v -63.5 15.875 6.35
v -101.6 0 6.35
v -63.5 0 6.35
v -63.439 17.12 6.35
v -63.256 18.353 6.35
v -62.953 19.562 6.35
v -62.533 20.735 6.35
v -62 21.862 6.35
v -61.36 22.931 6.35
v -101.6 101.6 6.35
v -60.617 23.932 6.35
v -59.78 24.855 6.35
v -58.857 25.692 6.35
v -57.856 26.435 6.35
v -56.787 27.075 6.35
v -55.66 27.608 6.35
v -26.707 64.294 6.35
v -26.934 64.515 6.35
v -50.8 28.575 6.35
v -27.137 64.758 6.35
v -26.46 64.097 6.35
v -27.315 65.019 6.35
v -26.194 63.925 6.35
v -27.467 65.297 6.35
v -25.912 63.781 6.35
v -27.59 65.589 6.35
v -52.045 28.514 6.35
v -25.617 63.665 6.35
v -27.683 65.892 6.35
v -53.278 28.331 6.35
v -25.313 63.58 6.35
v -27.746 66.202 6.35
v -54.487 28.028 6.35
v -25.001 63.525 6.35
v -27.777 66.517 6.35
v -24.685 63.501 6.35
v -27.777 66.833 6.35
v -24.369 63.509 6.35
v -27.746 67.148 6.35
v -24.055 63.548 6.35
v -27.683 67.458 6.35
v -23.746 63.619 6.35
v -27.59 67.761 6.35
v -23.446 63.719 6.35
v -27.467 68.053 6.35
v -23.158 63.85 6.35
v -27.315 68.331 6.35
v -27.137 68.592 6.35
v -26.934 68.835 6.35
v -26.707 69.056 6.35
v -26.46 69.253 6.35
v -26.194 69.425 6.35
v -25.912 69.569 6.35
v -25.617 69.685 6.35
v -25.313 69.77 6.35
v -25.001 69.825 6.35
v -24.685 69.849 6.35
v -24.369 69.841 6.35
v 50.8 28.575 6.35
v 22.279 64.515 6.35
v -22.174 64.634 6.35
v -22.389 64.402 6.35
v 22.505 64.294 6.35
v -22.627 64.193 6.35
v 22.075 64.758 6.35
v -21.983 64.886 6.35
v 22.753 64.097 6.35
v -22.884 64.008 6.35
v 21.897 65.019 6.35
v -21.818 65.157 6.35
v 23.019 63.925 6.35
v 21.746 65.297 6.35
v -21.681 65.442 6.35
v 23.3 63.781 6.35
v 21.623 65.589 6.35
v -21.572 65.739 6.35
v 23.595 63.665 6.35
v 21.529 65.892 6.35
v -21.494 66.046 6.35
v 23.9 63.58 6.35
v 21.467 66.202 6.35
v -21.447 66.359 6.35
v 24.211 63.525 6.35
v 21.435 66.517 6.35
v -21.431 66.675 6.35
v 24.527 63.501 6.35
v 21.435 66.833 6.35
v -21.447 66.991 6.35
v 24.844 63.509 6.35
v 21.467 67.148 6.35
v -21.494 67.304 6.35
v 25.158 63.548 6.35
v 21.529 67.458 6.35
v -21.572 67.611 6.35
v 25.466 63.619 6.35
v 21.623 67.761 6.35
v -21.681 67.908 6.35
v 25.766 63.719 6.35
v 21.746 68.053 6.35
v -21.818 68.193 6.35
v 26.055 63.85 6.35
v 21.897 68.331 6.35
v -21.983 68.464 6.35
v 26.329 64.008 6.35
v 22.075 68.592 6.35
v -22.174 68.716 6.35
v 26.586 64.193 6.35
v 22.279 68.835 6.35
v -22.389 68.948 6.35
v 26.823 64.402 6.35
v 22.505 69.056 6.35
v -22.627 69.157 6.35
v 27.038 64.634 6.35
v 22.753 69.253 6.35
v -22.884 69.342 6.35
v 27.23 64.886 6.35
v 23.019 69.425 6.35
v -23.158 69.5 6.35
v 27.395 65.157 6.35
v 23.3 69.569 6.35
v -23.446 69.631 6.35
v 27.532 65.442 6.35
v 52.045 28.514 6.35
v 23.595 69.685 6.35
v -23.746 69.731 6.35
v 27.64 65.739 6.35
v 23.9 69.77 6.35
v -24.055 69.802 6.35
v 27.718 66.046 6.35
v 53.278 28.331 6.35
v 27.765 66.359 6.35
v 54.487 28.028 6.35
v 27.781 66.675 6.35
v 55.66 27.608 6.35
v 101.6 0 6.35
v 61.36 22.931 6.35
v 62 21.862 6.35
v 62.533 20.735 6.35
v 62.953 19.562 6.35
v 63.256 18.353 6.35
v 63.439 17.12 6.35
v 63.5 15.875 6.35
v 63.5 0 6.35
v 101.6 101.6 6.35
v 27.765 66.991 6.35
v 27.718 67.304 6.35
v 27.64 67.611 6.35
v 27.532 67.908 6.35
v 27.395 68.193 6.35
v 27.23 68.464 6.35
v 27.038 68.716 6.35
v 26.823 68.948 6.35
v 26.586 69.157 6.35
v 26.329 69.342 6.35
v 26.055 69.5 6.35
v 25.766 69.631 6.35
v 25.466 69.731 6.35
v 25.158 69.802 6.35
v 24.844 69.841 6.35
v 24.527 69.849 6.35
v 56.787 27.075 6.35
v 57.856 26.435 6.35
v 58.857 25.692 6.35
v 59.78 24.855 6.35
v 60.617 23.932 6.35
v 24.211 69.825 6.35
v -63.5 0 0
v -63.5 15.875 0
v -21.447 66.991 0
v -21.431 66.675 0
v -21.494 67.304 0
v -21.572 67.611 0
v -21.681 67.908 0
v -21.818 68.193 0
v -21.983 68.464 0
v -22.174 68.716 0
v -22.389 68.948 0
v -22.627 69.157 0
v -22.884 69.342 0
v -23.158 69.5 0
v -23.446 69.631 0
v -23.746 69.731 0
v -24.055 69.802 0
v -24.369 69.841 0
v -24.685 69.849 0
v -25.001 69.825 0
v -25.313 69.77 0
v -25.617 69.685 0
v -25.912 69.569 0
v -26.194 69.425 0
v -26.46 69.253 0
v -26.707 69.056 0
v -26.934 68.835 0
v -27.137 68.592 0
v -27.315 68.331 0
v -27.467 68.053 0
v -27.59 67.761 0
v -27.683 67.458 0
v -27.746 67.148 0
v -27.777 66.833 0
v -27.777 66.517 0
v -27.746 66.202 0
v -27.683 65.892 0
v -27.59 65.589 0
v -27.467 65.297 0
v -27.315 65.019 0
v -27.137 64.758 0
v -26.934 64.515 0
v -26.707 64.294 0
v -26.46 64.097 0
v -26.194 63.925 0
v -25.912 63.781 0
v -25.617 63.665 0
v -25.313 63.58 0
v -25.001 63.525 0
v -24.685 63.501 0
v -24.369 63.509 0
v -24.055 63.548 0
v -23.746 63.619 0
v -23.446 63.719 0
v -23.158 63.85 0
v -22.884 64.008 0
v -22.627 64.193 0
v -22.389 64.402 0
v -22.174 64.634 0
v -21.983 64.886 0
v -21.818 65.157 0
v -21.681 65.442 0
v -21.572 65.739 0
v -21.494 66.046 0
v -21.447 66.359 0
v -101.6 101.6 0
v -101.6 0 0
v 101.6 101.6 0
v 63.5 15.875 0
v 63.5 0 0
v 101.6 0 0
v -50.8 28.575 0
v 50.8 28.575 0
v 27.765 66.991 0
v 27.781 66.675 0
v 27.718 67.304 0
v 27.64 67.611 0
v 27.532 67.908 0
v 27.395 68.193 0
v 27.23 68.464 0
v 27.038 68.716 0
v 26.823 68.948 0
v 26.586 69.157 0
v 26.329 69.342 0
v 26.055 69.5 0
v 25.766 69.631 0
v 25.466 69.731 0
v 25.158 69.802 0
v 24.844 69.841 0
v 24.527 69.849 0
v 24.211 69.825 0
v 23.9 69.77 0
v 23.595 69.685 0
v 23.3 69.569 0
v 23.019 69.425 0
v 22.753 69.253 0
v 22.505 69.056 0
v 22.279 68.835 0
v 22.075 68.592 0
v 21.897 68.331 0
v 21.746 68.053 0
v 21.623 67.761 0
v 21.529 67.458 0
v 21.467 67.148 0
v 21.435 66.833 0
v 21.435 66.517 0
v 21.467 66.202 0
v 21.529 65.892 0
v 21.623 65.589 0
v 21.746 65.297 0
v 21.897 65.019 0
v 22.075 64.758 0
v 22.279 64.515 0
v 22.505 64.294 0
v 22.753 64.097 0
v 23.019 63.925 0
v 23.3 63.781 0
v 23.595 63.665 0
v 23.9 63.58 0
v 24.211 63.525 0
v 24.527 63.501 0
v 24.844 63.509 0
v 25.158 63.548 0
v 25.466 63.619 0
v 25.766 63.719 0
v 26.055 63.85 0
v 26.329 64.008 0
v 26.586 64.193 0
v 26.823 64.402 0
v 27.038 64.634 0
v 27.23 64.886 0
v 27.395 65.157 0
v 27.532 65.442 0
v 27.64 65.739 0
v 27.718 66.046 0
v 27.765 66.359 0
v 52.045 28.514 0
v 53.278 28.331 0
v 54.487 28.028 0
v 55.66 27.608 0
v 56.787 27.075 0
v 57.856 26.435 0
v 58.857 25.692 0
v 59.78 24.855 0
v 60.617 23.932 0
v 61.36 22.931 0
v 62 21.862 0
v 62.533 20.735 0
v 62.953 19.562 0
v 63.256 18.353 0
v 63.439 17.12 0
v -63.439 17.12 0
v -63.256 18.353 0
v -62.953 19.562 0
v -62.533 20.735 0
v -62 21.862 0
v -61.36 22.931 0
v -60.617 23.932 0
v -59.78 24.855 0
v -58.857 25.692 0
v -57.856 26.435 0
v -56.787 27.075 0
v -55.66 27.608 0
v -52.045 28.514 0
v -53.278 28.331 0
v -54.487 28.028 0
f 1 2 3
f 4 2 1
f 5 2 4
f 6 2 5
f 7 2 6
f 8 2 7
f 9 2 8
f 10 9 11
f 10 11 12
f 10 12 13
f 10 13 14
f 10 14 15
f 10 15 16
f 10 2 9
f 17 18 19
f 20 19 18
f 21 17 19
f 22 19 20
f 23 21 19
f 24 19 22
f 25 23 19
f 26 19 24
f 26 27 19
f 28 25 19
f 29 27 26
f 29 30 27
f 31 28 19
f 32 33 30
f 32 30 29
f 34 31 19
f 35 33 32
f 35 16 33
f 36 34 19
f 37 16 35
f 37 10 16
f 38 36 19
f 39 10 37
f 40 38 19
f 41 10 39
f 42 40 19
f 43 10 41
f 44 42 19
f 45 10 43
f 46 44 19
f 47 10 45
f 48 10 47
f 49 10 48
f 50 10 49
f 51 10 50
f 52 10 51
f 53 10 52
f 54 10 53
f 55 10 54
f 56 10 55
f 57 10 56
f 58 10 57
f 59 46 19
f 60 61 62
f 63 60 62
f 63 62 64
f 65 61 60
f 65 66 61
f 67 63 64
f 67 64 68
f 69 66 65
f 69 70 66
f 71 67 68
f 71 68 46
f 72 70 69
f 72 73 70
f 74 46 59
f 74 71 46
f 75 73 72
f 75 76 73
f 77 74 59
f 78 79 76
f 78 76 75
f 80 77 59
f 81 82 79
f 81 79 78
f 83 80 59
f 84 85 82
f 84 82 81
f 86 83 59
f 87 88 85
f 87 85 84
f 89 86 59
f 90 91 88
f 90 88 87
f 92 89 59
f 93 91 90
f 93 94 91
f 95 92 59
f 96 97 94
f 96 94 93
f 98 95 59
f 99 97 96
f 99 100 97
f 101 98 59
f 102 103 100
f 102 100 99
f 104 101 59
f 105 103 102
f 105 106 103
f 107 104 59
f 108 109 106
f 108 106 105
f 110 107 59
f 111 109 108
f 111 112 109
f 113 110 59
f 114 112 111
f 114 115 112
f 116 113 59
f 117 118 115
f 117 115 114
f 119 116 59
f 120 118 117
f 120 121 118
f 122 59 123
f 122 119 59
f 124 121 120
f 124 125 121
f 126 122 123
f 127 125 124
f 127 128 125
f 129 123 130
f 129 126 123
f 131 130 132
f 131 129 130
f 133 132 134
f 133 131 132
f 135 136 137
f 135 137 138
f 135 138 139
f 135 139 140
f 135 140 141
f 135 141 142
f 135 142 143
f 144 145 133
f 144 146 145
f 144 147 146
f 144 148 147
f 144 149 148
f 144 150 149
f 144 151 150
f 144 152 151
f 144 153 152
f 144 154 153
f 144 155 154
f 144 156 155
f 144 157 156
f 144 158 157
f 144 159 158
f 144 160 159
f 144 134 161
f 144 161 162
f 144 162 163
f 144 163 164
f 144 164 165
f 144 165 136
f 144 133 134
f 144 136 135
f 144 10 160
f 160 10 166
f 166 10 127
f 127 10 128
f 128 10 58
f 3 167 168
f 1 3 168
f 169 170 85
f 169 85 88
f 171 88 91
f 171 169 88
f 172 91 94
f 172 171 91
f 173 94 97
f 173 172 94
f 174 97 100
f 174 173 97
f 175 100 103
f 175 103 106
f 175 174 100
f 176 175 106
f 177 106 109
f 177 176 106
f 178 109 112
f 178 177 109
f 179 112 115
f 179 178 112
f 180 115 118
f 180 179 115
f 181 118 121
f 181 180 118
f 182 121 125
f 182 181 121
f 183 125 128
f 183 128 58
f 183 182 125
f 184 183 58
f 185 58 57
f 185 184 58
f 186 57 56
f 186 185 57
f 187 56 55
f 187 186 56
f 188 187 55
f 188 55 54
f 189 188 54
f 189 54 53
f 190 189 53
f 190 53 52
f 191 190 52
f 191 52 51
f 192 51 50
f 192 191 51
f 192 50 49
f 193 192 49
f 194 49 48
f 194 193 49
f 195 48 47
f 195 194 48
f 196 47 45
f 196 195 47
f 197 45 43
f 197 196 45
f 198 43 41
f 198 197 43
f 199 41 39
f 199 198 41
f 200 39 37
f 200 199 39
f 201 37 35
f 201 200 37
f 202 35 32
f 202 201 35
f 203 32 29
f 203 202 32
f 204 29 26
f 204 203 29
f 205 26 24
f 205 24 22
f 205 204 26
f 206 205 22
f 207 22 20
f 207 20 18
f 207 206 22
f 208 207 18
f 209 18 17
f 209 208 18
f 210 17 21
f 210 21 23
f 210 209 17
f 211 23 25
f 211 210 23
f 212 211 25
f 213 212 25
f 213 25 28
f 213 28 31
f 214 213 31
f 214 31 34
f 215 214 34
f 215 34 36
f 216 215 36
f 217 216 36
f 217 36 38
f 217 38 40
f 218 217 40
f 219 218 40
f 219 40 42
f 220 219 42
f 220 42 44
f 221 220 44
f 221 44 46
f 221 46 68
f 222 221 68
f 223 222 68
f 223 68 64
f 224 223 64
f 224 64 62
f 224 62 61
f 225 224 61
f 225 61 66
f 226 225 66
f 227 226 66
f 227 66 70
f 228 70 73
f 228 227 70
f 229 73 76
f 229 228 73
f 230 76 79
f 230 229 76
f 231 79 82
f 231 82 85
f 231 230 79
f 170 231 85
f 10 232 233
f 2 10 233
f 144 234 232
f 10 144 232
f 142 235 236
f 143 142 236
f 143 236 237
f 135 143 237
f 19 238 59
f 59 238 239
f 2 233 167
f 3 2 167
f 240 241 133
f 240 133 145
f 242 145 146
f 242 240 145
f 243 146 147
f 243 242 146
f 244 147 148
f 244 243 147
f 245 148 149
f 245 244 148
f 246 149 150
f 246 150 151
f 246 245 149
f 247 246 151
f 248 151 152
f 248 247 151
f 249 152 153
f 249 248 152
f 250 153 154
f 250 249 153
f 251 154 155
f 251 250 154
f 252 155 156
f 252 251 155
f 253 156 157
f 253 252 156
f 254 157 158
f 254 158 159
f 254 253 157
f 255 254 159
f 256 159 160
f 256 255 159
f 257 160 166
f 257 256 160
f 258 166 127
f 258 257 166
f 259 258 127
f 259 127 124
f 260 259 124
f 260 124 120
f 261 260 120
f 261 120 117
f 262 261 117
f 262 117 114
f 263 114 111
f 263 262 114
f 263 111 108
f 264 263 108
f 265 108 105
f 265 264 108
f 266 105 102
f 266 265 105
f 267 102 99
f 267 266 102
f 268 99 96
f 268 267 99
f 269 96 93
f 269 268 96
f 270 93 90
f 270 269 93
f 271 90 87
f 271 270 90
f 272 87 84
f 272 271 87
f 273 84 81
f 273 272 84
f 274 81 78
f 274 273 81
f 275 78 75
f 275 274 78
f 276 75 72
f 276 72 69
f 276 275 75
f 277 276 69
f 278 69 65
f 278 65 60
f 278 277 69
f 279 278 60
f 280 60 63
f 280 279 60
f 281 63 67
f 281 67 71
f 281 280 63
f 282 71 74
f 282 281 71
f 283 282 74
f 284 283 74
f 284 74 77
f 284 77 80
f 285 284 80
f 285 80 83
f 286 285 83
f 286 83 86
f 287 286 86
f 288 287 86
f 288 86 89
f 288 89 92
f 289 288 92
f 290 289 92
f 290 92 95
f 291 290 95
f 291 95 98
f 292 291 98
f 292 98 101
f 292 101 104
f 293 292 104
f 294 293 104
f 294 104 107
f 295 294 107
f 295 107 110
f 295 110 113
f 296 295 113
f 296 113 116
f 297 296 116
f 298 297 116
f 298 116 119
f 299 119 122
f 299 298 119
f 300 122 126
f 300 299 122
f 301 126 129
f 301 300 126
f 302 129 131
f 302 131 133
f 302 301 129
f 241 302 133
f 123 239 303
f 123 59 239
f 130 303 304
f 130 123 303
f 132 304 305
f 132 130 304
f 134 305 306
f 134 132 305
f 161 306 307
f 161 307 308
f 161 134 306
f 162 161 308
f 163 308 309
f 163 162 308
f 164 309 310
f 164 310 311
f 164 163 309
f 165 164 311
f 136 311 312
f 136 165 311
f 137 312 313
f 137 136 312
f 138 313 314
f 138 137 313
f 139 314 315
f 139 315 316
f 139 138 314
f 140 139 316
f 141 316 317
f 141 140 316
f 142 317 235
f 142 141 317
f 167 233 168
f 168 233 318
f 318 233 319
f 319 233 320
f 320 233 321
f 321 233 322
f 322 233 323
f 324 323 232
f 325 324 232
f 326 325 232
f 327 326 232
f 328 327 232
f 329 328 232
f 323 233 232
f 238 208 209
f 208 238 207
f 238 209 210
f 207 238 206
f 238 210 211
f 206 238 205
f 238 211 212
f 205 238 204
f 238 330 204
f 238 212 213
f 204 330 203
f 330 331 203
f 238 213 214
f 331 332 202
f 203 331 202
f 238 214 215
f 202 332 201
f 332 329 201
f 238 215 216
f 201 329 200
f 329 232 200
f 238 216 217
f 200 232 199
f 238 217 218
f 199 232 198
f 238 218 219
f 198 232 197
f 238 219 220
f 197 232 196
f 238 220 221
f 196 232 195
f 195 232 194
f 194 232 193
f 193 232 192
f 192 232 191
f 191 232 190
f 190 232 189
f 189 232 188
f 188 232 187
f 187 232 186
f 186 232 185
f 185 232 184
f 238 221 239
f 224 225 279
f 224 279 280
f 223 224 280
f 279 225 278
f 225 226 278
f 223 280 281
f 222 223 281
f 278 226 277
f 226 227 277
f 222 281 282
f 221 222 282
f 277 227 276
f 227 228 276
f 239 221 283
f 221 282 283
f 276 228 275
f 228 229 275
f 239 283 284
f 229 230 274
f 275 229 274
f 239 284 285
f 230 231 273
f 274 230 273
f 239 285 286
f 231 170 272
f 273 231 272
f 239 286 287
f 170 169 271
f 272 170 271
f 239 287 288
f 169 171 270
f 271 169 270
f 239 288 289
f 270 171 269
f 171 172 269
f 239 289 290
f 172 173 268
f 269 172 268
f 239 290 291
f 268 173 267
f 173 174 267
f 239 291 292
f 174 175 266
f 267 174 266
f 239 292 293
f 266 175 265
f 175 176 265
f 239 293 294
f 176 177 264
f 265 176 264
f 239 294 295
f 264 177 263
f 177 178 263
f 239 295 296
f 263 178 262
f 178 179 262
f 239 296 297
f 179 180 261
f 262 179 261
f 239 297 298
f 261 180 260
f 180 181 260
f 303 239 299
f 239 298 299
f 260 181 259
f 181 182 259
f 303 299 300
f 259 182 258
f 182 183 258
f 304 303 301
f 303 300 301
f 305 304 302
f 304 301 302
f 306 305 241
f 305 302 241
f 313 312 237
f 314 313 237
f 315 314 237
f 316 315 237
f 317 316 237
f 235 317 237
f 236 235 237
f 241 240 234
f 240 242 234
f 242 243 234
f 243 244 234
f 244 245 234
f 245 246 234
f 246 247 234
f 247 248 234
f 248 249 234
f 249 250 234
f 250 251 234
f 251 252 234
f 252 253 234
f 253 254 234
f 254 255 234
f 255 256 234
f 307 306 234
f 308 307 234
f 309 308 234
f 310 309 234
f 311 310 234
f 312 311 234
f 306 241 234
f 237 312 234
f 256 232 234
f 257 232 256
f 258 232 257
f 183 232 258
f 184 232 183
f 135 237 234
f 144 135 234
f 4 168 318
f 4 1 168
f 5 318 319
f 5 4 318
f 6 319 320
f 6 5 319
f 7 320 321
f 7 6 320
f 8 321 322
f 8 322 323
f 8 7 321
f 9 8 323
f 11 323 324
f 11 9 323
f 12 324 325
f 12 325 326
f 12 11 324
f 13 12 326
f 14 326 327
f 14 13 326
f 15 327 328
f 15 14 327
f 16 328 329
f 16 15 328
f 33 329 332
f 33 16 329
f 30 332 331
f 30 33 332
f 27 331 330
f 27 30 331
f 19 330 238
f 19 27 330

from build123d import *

# Parameters (mm, degrees)
F0_R     = 3.175
F1_DEPTH = 6.35
F2_R     = 12.7


with BuildPart() as f1:
    # F0 (on Top) → F1 (new body)
    with BuildSketch(Plane.XY):
        Polygon((0, 101.6), (-101.6, 101.6), (-101.6, 0), (-63.5, 0), (-63.5, 28.575), (0, 28.575), align=None)
        with Locations((-24.60625, 66.675)):
            Circle(F0_R, mode=Mode.SUBTRACT)
        Polygon((101.6, 101.6), (0, 101.6), (0, 28.575), (63.5, 28.575), (63.5, 0), (101.6, 0), align=None)
        with Locations((24.60625, 66.675)):
            Circle(F0_R, mode=Mode.SUBTRACT)
    extrude(amount=F1_DEPTH)

    # F2
    f2_edges = [f1.edges().sort_by_distance(p)[0] for p in [
        (-63.5, 28.575, 3.175),
        (63.5, 28.575, 3.175),
    ]]
    fillet(f2_edges, radius=F2_R)


solid = f1.part
